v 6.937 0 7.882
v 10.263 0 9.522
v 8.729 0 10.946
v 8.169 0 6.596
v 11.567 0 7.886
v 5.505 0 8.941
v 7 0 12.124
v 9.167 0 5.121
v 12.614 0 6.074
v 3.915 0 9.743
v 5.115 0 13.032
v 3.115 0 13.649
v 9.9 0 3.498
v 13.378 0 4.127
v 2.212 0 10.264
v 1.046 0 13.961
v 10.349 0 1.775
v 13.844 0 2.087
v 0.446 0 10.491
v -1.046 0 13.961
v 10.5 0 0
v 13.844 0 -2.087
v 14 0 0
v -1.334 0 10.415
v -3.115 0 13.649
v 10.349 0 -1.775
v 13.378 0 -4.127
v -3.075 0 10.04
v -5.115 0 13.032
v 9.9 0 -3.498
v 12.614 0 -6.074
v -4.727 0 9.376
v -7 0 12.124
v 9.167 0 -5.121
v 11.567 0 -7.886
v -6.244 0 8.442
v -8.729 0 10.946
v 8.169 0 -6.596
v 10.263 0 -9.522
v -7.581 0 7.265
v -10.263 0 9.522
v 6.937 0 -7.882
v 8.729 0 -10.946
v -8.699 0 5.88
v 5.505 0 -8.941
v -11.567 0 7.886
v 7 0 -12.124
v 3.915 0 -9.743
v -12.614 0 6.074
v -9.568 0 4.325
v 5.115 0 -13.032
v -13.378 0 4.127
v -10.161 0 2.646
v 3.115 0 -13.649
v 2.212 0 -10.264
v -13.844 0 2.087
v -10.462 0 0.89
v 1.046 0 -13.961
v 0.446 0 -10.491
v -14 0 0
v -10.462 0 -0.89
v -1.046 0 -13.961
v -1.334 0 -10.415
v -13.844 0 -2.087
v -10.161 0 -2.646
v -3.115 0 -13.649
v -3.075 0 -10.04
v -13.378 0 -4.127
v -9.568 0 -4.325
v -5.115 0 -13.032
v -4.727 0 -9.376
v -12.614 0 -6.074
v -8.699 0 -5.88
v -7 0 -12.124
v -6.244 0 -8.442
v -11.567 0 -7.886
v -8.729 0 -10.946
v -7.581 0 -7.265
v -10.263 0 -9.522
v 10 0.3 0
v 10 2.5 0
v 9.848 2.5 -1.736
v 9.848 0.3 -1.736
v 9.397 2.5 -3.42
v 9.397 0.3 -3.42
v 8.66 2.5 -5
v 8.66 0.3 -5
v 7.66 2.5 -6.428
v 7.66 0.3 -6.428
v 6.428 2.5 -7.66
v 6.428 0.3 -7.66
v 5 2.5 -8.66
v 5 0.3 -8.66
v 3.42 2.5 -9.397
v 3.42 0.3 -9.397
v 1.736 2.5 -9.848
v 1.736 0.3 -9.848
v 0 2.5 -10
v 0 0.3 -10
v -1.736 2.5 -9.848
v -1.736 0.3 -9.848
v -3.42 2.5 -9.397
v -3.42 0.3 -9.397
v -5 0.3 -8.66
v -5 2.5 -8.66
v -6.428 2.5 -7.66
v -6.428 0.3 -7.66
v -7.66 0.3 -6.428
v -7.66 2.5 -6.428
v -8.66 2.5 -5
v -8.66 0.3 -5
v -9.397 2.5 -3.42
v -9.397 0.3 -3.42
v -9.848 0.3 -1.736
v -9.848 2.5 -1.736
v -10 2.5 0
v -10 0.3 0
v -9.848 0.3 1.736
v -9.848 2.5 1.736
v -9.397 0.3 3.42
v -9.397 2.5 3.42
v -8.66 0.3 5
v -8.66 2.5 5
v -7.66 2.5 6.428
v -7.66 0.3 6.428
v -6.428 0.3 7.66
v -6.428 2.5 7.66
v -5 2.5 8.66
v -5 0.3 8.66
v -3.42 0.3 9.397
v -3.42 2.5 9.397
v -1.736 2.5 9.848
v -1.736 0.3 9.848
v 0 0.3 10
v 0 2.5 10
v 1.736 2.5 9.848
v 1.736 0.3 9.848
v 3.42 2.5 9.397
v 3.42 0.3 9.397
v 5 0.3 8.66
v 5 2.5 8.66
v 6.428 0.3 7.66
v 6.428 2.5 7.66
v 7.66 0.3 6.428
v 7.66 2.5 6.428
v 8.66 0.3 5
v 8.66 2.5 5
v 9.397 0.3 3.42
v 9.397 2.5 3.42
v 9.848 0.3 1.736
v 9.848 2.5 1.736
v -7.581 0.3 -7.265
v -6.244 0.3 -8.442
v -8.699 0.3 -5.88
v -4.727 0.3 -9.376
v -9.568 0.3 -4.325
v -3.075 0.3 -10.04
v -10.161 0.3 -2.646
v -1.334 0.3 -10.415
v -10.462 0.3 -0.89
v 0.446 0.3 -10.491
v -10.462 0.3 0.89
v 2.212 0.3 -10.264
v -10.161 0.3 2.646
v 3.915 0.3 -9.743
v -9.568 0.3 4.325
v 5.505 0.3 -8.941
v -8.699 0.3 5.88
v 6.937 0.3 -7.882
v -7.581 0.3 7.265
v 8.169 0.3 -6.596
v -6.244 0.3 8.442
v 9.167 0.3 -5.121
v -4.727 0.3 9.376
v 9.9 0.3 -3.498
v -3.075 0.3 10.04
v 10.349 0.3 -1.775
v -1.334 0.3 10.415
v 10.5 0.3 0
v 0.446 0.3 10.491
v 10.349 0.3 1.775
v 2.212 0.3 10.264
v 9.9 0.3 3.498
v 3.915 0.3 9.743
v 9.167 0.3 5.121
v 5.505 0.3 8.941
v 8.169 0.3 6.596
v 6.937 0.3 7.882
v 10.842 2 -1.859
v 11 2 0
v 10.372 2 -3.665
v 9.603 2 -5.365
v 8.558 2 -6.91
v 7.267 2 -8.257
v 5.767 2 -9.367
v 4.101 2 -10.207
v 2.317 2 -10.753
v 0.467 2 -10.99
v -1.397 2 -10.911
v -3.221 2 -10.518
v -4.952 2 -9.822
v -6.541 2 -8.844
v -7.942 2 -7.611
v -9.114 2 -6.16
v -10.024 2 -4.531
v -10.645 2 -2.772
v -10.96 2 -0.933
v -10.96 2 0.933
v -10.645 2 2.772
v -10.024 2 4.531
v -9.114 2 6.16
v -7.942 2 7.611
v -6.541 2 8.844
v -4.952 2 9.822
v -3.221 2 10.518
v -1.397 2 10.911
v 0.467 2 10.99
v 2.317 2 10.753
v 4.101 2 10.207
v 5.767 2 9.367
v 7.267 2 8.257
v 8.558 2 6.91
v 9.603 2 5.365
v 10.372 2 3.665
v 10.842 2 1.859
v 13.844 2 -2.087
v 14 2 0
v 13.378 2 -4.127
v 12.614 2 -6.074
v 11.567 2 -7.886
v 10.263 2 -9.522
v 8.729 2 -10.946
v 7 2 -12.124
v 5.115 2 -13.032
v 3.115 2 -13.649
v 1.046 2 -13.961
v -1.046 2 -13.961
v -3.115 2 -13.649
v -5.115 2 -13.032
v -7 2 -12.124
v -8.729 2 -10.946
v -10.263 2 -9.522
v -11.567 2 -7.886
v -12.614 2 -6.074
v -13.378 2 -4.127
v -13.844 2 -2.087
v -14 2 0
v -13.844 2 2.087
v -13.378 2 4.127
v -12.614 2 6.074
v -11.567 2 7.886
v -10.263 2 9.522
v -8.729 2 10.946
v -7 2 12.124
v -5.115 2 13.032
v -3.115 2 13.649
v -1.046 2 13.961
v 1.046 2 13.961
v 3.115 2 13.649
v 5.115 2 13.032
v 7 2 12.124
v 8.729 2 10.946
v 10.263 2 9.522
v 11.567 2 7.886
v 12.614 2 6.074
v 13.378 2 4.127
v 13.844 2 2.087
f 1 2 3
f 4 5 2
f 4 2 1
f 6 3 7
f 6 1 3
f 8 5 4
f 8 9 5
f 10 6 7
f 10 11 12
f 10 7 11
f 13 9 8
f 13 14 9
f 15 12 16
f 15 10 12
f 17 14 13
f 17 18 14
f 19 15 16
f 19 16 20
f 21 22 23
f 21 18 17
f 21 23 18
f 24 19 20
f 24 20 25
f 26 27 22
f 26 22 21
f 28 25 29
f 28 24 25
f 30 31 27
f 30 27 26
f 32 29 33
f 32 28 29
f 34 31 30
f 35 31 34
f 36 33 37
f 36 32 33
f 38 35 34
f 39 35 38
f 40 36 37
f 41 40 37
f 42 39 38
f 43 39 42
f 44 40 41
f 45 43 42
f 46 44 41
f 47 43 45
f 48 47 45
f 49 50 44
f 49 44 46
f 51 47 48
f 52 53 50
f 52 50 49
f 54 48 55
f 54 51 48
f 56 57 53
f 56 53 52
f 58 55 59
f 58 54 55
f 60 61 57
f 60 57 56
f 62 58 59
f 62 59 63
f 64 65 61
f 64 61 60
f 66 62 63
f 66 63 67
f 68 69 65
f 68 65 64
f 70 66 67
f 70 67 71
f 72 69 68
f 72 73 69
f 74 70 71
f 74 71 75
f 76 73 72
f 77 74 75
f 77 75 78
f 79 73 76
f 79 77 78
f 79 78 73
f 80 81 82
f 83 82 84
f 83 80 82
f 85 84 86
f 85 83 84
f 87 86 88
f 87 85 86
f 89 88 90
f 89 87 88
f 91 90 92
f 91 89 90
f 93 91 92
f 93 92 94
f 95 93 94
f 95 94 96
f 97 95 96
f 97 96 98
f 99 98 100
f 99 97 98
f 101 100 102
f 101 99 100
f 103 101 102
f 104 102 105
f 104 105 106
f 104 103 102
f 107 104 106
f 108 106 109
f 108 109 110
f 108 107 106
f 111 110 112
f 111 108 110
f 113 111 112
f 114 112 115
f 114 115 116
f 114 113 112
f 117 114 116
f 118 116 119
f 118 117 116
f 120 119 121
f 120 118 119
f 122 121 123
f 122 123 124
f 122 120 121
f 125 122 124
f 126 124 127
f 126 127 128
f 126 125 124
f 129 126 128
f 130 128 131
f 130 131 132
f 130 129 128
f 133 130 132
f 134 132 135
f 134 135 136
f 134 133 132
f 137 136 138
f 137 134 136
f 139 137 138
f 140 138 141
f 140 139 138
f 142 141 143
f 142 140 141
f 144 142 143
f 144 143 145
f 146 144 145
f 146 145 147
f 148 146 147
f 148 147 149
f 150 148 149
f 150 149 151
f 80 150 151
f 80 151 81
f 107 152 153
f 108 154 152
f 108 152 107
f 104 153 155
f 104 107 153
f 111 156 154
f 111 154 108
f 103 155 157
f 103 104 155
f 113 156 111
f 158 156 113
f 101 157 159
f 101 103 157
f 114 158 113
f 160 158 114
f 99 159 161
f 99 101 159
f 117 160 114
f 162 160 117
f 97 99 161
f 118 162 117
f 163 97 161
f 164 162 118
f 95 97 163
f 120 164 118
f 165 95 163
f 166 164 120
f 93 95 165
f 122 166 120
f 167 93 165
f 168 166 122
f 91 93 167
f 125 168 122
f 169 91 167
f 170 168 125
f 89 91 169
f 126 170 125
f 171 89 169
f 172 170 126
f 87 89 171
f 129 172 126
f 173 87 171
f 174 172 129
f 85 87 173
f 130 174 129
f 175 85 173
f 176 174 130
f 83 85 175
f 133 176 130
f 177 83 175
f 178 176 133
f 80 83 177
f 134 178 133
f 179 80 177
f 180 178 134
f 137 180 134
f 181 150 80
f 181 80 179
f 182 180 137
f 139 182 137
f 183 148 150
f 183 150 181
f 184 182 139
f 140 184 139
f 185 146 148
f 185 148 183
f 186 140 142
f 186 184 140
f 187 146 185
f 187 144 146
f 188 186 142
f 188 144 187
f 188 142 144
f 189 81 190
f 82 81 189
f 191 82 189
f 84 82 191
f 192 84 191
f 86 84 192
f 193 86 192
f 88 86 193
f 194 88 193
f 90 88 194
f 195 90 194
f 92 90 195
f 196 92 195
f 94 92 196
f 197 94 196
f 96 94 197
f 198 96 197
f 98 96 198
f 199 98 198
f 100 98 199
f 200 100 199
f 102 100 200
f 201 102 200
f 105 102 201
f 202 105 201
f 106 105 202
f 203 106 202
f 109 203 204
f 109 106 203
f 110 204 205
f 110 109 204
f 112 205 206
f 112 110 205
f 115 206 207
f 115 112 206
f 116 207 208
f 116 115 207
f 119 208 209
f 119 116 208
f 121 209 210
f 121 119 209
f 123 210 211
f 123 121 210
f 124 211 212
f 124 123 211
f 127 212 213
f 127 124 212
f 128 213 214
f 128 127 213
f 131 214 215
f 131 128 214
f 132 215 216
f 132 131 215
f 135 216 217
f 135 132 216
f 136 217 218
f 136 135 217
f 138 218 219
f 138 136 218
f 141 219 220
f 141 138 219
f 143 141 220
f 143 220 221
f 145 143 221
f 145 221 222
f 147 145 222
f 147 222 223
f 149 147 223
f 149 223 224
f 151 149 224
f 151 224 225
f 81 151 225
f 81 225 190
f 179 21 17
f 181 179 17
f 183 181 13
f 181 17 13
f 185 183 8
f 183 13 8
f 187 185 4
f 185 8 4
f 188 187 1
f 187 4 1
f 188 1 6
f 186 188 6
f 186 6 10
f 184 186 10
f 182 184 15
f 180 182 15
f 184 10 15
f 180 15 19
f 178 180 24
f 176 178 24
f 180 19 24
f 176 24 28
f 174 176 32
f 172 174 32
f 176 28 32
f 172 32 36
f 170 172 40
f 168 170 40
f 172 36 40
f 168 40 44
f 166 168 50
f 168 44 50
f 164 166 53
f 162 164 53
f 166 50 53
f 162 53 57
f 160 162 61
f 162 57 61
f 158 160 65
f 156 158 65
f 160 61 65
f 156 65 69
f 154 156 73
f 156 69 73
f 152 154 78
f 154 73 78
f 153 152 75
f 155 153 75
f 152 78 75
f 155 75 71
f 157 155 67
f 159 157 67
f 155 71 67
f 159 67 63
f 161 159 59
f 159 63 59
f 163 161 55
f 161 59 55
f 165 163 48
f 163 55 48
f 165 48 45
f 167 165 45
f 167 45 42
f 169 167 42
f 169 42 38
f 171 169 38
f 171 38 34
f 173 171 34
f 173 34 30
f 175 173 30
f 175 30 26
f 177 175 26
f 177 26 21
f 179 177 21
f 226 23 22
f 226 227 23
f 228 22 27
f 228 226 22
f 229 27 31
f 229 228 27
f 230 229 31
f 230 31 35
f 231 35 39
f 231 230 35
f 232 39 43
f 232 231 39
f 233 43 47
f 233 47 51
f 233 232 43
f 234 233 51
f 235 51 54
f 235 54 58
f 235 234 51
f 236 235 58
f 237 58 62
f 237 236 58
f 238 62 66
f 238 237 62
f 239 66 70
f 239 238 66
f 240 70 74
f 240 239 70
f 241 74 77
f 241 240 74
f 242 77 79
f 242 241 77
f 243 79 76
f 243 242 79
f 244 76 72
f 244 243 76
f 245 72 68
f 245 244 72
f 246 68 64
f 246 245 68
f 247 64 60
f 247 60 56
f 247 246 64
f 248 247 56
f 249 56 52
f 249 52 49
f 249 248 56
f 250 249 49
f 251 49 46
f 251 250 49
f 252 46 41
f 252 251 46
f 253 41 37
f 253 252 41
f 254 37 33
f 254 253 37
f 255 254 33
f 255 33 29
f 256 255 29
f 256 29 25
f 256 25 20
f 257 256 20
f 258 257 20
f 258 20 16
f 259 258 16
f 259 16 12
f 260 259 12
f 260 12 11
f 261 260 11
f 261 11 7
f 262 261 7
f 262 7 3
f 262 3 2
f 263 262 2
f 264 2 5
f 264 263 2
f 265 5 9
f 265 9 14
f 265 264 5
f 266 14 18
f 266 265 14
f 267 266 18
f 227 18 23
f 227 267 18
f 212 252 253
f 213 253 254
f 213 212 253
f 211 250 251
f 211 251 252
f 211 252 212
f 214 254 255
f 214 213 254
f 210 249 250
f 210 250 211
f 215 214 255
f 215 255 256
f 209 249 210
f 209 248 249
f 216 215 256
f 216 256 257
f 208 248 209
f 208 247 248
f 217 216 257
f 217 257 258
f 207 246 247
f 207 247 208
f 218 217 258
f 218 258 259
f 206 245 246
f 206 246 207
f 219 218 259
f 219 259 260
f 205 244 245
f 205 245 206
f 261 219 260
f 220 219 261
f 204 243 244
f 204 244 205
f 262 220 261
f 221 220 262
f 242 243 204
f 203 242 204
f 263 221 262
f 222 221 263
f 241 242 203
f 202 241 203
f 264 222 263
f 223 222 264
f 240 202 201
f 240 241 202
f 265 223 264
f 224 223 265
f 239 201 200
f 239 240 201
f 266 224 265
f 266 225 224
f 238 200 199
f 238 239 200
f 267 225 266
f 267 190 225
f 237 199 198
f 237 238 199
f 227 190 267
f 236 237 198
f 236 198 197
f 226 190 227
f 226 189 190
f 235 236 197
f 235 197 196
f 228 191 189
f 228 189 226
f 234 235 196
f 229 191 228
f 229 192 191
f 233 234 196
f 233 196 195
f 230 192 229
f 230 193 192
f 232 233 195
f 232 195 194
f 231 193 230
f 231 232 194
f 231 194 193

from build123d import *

# Parameters (mm, degrees)
SKETCH2_R          = 10.5
SKETCH2_R_2        = 10
CUT_EXTRUDE1_DEPTH = 0.3


with BuildPart() as part:
    # Sketch1 → Revolve1 (revolve)
    with BuildSketch(Plane.XY):
        Polygon((10, 0), (14, 0), (14, 2), (11, 2), (10, 2), align=None)
        Polygon((10, 2), (11, 2), (10, 2.5), align=None)
    revolve(axis=Axis((0, 0, 0), (0, 1, 0)))

    # Sketch2 → Cut-Extrude1 (cut)
    with BuildSketch(Plane.XZ):
        Circle(SKETCH2_R)
        Circle(SKETCH2_R_2, mode=Mode.SUBTRACT)
    extrude(amount=-CUT_EXTRUDE1_DEPTH, mode=Mode.SUBTRACT)


solid = part.part
